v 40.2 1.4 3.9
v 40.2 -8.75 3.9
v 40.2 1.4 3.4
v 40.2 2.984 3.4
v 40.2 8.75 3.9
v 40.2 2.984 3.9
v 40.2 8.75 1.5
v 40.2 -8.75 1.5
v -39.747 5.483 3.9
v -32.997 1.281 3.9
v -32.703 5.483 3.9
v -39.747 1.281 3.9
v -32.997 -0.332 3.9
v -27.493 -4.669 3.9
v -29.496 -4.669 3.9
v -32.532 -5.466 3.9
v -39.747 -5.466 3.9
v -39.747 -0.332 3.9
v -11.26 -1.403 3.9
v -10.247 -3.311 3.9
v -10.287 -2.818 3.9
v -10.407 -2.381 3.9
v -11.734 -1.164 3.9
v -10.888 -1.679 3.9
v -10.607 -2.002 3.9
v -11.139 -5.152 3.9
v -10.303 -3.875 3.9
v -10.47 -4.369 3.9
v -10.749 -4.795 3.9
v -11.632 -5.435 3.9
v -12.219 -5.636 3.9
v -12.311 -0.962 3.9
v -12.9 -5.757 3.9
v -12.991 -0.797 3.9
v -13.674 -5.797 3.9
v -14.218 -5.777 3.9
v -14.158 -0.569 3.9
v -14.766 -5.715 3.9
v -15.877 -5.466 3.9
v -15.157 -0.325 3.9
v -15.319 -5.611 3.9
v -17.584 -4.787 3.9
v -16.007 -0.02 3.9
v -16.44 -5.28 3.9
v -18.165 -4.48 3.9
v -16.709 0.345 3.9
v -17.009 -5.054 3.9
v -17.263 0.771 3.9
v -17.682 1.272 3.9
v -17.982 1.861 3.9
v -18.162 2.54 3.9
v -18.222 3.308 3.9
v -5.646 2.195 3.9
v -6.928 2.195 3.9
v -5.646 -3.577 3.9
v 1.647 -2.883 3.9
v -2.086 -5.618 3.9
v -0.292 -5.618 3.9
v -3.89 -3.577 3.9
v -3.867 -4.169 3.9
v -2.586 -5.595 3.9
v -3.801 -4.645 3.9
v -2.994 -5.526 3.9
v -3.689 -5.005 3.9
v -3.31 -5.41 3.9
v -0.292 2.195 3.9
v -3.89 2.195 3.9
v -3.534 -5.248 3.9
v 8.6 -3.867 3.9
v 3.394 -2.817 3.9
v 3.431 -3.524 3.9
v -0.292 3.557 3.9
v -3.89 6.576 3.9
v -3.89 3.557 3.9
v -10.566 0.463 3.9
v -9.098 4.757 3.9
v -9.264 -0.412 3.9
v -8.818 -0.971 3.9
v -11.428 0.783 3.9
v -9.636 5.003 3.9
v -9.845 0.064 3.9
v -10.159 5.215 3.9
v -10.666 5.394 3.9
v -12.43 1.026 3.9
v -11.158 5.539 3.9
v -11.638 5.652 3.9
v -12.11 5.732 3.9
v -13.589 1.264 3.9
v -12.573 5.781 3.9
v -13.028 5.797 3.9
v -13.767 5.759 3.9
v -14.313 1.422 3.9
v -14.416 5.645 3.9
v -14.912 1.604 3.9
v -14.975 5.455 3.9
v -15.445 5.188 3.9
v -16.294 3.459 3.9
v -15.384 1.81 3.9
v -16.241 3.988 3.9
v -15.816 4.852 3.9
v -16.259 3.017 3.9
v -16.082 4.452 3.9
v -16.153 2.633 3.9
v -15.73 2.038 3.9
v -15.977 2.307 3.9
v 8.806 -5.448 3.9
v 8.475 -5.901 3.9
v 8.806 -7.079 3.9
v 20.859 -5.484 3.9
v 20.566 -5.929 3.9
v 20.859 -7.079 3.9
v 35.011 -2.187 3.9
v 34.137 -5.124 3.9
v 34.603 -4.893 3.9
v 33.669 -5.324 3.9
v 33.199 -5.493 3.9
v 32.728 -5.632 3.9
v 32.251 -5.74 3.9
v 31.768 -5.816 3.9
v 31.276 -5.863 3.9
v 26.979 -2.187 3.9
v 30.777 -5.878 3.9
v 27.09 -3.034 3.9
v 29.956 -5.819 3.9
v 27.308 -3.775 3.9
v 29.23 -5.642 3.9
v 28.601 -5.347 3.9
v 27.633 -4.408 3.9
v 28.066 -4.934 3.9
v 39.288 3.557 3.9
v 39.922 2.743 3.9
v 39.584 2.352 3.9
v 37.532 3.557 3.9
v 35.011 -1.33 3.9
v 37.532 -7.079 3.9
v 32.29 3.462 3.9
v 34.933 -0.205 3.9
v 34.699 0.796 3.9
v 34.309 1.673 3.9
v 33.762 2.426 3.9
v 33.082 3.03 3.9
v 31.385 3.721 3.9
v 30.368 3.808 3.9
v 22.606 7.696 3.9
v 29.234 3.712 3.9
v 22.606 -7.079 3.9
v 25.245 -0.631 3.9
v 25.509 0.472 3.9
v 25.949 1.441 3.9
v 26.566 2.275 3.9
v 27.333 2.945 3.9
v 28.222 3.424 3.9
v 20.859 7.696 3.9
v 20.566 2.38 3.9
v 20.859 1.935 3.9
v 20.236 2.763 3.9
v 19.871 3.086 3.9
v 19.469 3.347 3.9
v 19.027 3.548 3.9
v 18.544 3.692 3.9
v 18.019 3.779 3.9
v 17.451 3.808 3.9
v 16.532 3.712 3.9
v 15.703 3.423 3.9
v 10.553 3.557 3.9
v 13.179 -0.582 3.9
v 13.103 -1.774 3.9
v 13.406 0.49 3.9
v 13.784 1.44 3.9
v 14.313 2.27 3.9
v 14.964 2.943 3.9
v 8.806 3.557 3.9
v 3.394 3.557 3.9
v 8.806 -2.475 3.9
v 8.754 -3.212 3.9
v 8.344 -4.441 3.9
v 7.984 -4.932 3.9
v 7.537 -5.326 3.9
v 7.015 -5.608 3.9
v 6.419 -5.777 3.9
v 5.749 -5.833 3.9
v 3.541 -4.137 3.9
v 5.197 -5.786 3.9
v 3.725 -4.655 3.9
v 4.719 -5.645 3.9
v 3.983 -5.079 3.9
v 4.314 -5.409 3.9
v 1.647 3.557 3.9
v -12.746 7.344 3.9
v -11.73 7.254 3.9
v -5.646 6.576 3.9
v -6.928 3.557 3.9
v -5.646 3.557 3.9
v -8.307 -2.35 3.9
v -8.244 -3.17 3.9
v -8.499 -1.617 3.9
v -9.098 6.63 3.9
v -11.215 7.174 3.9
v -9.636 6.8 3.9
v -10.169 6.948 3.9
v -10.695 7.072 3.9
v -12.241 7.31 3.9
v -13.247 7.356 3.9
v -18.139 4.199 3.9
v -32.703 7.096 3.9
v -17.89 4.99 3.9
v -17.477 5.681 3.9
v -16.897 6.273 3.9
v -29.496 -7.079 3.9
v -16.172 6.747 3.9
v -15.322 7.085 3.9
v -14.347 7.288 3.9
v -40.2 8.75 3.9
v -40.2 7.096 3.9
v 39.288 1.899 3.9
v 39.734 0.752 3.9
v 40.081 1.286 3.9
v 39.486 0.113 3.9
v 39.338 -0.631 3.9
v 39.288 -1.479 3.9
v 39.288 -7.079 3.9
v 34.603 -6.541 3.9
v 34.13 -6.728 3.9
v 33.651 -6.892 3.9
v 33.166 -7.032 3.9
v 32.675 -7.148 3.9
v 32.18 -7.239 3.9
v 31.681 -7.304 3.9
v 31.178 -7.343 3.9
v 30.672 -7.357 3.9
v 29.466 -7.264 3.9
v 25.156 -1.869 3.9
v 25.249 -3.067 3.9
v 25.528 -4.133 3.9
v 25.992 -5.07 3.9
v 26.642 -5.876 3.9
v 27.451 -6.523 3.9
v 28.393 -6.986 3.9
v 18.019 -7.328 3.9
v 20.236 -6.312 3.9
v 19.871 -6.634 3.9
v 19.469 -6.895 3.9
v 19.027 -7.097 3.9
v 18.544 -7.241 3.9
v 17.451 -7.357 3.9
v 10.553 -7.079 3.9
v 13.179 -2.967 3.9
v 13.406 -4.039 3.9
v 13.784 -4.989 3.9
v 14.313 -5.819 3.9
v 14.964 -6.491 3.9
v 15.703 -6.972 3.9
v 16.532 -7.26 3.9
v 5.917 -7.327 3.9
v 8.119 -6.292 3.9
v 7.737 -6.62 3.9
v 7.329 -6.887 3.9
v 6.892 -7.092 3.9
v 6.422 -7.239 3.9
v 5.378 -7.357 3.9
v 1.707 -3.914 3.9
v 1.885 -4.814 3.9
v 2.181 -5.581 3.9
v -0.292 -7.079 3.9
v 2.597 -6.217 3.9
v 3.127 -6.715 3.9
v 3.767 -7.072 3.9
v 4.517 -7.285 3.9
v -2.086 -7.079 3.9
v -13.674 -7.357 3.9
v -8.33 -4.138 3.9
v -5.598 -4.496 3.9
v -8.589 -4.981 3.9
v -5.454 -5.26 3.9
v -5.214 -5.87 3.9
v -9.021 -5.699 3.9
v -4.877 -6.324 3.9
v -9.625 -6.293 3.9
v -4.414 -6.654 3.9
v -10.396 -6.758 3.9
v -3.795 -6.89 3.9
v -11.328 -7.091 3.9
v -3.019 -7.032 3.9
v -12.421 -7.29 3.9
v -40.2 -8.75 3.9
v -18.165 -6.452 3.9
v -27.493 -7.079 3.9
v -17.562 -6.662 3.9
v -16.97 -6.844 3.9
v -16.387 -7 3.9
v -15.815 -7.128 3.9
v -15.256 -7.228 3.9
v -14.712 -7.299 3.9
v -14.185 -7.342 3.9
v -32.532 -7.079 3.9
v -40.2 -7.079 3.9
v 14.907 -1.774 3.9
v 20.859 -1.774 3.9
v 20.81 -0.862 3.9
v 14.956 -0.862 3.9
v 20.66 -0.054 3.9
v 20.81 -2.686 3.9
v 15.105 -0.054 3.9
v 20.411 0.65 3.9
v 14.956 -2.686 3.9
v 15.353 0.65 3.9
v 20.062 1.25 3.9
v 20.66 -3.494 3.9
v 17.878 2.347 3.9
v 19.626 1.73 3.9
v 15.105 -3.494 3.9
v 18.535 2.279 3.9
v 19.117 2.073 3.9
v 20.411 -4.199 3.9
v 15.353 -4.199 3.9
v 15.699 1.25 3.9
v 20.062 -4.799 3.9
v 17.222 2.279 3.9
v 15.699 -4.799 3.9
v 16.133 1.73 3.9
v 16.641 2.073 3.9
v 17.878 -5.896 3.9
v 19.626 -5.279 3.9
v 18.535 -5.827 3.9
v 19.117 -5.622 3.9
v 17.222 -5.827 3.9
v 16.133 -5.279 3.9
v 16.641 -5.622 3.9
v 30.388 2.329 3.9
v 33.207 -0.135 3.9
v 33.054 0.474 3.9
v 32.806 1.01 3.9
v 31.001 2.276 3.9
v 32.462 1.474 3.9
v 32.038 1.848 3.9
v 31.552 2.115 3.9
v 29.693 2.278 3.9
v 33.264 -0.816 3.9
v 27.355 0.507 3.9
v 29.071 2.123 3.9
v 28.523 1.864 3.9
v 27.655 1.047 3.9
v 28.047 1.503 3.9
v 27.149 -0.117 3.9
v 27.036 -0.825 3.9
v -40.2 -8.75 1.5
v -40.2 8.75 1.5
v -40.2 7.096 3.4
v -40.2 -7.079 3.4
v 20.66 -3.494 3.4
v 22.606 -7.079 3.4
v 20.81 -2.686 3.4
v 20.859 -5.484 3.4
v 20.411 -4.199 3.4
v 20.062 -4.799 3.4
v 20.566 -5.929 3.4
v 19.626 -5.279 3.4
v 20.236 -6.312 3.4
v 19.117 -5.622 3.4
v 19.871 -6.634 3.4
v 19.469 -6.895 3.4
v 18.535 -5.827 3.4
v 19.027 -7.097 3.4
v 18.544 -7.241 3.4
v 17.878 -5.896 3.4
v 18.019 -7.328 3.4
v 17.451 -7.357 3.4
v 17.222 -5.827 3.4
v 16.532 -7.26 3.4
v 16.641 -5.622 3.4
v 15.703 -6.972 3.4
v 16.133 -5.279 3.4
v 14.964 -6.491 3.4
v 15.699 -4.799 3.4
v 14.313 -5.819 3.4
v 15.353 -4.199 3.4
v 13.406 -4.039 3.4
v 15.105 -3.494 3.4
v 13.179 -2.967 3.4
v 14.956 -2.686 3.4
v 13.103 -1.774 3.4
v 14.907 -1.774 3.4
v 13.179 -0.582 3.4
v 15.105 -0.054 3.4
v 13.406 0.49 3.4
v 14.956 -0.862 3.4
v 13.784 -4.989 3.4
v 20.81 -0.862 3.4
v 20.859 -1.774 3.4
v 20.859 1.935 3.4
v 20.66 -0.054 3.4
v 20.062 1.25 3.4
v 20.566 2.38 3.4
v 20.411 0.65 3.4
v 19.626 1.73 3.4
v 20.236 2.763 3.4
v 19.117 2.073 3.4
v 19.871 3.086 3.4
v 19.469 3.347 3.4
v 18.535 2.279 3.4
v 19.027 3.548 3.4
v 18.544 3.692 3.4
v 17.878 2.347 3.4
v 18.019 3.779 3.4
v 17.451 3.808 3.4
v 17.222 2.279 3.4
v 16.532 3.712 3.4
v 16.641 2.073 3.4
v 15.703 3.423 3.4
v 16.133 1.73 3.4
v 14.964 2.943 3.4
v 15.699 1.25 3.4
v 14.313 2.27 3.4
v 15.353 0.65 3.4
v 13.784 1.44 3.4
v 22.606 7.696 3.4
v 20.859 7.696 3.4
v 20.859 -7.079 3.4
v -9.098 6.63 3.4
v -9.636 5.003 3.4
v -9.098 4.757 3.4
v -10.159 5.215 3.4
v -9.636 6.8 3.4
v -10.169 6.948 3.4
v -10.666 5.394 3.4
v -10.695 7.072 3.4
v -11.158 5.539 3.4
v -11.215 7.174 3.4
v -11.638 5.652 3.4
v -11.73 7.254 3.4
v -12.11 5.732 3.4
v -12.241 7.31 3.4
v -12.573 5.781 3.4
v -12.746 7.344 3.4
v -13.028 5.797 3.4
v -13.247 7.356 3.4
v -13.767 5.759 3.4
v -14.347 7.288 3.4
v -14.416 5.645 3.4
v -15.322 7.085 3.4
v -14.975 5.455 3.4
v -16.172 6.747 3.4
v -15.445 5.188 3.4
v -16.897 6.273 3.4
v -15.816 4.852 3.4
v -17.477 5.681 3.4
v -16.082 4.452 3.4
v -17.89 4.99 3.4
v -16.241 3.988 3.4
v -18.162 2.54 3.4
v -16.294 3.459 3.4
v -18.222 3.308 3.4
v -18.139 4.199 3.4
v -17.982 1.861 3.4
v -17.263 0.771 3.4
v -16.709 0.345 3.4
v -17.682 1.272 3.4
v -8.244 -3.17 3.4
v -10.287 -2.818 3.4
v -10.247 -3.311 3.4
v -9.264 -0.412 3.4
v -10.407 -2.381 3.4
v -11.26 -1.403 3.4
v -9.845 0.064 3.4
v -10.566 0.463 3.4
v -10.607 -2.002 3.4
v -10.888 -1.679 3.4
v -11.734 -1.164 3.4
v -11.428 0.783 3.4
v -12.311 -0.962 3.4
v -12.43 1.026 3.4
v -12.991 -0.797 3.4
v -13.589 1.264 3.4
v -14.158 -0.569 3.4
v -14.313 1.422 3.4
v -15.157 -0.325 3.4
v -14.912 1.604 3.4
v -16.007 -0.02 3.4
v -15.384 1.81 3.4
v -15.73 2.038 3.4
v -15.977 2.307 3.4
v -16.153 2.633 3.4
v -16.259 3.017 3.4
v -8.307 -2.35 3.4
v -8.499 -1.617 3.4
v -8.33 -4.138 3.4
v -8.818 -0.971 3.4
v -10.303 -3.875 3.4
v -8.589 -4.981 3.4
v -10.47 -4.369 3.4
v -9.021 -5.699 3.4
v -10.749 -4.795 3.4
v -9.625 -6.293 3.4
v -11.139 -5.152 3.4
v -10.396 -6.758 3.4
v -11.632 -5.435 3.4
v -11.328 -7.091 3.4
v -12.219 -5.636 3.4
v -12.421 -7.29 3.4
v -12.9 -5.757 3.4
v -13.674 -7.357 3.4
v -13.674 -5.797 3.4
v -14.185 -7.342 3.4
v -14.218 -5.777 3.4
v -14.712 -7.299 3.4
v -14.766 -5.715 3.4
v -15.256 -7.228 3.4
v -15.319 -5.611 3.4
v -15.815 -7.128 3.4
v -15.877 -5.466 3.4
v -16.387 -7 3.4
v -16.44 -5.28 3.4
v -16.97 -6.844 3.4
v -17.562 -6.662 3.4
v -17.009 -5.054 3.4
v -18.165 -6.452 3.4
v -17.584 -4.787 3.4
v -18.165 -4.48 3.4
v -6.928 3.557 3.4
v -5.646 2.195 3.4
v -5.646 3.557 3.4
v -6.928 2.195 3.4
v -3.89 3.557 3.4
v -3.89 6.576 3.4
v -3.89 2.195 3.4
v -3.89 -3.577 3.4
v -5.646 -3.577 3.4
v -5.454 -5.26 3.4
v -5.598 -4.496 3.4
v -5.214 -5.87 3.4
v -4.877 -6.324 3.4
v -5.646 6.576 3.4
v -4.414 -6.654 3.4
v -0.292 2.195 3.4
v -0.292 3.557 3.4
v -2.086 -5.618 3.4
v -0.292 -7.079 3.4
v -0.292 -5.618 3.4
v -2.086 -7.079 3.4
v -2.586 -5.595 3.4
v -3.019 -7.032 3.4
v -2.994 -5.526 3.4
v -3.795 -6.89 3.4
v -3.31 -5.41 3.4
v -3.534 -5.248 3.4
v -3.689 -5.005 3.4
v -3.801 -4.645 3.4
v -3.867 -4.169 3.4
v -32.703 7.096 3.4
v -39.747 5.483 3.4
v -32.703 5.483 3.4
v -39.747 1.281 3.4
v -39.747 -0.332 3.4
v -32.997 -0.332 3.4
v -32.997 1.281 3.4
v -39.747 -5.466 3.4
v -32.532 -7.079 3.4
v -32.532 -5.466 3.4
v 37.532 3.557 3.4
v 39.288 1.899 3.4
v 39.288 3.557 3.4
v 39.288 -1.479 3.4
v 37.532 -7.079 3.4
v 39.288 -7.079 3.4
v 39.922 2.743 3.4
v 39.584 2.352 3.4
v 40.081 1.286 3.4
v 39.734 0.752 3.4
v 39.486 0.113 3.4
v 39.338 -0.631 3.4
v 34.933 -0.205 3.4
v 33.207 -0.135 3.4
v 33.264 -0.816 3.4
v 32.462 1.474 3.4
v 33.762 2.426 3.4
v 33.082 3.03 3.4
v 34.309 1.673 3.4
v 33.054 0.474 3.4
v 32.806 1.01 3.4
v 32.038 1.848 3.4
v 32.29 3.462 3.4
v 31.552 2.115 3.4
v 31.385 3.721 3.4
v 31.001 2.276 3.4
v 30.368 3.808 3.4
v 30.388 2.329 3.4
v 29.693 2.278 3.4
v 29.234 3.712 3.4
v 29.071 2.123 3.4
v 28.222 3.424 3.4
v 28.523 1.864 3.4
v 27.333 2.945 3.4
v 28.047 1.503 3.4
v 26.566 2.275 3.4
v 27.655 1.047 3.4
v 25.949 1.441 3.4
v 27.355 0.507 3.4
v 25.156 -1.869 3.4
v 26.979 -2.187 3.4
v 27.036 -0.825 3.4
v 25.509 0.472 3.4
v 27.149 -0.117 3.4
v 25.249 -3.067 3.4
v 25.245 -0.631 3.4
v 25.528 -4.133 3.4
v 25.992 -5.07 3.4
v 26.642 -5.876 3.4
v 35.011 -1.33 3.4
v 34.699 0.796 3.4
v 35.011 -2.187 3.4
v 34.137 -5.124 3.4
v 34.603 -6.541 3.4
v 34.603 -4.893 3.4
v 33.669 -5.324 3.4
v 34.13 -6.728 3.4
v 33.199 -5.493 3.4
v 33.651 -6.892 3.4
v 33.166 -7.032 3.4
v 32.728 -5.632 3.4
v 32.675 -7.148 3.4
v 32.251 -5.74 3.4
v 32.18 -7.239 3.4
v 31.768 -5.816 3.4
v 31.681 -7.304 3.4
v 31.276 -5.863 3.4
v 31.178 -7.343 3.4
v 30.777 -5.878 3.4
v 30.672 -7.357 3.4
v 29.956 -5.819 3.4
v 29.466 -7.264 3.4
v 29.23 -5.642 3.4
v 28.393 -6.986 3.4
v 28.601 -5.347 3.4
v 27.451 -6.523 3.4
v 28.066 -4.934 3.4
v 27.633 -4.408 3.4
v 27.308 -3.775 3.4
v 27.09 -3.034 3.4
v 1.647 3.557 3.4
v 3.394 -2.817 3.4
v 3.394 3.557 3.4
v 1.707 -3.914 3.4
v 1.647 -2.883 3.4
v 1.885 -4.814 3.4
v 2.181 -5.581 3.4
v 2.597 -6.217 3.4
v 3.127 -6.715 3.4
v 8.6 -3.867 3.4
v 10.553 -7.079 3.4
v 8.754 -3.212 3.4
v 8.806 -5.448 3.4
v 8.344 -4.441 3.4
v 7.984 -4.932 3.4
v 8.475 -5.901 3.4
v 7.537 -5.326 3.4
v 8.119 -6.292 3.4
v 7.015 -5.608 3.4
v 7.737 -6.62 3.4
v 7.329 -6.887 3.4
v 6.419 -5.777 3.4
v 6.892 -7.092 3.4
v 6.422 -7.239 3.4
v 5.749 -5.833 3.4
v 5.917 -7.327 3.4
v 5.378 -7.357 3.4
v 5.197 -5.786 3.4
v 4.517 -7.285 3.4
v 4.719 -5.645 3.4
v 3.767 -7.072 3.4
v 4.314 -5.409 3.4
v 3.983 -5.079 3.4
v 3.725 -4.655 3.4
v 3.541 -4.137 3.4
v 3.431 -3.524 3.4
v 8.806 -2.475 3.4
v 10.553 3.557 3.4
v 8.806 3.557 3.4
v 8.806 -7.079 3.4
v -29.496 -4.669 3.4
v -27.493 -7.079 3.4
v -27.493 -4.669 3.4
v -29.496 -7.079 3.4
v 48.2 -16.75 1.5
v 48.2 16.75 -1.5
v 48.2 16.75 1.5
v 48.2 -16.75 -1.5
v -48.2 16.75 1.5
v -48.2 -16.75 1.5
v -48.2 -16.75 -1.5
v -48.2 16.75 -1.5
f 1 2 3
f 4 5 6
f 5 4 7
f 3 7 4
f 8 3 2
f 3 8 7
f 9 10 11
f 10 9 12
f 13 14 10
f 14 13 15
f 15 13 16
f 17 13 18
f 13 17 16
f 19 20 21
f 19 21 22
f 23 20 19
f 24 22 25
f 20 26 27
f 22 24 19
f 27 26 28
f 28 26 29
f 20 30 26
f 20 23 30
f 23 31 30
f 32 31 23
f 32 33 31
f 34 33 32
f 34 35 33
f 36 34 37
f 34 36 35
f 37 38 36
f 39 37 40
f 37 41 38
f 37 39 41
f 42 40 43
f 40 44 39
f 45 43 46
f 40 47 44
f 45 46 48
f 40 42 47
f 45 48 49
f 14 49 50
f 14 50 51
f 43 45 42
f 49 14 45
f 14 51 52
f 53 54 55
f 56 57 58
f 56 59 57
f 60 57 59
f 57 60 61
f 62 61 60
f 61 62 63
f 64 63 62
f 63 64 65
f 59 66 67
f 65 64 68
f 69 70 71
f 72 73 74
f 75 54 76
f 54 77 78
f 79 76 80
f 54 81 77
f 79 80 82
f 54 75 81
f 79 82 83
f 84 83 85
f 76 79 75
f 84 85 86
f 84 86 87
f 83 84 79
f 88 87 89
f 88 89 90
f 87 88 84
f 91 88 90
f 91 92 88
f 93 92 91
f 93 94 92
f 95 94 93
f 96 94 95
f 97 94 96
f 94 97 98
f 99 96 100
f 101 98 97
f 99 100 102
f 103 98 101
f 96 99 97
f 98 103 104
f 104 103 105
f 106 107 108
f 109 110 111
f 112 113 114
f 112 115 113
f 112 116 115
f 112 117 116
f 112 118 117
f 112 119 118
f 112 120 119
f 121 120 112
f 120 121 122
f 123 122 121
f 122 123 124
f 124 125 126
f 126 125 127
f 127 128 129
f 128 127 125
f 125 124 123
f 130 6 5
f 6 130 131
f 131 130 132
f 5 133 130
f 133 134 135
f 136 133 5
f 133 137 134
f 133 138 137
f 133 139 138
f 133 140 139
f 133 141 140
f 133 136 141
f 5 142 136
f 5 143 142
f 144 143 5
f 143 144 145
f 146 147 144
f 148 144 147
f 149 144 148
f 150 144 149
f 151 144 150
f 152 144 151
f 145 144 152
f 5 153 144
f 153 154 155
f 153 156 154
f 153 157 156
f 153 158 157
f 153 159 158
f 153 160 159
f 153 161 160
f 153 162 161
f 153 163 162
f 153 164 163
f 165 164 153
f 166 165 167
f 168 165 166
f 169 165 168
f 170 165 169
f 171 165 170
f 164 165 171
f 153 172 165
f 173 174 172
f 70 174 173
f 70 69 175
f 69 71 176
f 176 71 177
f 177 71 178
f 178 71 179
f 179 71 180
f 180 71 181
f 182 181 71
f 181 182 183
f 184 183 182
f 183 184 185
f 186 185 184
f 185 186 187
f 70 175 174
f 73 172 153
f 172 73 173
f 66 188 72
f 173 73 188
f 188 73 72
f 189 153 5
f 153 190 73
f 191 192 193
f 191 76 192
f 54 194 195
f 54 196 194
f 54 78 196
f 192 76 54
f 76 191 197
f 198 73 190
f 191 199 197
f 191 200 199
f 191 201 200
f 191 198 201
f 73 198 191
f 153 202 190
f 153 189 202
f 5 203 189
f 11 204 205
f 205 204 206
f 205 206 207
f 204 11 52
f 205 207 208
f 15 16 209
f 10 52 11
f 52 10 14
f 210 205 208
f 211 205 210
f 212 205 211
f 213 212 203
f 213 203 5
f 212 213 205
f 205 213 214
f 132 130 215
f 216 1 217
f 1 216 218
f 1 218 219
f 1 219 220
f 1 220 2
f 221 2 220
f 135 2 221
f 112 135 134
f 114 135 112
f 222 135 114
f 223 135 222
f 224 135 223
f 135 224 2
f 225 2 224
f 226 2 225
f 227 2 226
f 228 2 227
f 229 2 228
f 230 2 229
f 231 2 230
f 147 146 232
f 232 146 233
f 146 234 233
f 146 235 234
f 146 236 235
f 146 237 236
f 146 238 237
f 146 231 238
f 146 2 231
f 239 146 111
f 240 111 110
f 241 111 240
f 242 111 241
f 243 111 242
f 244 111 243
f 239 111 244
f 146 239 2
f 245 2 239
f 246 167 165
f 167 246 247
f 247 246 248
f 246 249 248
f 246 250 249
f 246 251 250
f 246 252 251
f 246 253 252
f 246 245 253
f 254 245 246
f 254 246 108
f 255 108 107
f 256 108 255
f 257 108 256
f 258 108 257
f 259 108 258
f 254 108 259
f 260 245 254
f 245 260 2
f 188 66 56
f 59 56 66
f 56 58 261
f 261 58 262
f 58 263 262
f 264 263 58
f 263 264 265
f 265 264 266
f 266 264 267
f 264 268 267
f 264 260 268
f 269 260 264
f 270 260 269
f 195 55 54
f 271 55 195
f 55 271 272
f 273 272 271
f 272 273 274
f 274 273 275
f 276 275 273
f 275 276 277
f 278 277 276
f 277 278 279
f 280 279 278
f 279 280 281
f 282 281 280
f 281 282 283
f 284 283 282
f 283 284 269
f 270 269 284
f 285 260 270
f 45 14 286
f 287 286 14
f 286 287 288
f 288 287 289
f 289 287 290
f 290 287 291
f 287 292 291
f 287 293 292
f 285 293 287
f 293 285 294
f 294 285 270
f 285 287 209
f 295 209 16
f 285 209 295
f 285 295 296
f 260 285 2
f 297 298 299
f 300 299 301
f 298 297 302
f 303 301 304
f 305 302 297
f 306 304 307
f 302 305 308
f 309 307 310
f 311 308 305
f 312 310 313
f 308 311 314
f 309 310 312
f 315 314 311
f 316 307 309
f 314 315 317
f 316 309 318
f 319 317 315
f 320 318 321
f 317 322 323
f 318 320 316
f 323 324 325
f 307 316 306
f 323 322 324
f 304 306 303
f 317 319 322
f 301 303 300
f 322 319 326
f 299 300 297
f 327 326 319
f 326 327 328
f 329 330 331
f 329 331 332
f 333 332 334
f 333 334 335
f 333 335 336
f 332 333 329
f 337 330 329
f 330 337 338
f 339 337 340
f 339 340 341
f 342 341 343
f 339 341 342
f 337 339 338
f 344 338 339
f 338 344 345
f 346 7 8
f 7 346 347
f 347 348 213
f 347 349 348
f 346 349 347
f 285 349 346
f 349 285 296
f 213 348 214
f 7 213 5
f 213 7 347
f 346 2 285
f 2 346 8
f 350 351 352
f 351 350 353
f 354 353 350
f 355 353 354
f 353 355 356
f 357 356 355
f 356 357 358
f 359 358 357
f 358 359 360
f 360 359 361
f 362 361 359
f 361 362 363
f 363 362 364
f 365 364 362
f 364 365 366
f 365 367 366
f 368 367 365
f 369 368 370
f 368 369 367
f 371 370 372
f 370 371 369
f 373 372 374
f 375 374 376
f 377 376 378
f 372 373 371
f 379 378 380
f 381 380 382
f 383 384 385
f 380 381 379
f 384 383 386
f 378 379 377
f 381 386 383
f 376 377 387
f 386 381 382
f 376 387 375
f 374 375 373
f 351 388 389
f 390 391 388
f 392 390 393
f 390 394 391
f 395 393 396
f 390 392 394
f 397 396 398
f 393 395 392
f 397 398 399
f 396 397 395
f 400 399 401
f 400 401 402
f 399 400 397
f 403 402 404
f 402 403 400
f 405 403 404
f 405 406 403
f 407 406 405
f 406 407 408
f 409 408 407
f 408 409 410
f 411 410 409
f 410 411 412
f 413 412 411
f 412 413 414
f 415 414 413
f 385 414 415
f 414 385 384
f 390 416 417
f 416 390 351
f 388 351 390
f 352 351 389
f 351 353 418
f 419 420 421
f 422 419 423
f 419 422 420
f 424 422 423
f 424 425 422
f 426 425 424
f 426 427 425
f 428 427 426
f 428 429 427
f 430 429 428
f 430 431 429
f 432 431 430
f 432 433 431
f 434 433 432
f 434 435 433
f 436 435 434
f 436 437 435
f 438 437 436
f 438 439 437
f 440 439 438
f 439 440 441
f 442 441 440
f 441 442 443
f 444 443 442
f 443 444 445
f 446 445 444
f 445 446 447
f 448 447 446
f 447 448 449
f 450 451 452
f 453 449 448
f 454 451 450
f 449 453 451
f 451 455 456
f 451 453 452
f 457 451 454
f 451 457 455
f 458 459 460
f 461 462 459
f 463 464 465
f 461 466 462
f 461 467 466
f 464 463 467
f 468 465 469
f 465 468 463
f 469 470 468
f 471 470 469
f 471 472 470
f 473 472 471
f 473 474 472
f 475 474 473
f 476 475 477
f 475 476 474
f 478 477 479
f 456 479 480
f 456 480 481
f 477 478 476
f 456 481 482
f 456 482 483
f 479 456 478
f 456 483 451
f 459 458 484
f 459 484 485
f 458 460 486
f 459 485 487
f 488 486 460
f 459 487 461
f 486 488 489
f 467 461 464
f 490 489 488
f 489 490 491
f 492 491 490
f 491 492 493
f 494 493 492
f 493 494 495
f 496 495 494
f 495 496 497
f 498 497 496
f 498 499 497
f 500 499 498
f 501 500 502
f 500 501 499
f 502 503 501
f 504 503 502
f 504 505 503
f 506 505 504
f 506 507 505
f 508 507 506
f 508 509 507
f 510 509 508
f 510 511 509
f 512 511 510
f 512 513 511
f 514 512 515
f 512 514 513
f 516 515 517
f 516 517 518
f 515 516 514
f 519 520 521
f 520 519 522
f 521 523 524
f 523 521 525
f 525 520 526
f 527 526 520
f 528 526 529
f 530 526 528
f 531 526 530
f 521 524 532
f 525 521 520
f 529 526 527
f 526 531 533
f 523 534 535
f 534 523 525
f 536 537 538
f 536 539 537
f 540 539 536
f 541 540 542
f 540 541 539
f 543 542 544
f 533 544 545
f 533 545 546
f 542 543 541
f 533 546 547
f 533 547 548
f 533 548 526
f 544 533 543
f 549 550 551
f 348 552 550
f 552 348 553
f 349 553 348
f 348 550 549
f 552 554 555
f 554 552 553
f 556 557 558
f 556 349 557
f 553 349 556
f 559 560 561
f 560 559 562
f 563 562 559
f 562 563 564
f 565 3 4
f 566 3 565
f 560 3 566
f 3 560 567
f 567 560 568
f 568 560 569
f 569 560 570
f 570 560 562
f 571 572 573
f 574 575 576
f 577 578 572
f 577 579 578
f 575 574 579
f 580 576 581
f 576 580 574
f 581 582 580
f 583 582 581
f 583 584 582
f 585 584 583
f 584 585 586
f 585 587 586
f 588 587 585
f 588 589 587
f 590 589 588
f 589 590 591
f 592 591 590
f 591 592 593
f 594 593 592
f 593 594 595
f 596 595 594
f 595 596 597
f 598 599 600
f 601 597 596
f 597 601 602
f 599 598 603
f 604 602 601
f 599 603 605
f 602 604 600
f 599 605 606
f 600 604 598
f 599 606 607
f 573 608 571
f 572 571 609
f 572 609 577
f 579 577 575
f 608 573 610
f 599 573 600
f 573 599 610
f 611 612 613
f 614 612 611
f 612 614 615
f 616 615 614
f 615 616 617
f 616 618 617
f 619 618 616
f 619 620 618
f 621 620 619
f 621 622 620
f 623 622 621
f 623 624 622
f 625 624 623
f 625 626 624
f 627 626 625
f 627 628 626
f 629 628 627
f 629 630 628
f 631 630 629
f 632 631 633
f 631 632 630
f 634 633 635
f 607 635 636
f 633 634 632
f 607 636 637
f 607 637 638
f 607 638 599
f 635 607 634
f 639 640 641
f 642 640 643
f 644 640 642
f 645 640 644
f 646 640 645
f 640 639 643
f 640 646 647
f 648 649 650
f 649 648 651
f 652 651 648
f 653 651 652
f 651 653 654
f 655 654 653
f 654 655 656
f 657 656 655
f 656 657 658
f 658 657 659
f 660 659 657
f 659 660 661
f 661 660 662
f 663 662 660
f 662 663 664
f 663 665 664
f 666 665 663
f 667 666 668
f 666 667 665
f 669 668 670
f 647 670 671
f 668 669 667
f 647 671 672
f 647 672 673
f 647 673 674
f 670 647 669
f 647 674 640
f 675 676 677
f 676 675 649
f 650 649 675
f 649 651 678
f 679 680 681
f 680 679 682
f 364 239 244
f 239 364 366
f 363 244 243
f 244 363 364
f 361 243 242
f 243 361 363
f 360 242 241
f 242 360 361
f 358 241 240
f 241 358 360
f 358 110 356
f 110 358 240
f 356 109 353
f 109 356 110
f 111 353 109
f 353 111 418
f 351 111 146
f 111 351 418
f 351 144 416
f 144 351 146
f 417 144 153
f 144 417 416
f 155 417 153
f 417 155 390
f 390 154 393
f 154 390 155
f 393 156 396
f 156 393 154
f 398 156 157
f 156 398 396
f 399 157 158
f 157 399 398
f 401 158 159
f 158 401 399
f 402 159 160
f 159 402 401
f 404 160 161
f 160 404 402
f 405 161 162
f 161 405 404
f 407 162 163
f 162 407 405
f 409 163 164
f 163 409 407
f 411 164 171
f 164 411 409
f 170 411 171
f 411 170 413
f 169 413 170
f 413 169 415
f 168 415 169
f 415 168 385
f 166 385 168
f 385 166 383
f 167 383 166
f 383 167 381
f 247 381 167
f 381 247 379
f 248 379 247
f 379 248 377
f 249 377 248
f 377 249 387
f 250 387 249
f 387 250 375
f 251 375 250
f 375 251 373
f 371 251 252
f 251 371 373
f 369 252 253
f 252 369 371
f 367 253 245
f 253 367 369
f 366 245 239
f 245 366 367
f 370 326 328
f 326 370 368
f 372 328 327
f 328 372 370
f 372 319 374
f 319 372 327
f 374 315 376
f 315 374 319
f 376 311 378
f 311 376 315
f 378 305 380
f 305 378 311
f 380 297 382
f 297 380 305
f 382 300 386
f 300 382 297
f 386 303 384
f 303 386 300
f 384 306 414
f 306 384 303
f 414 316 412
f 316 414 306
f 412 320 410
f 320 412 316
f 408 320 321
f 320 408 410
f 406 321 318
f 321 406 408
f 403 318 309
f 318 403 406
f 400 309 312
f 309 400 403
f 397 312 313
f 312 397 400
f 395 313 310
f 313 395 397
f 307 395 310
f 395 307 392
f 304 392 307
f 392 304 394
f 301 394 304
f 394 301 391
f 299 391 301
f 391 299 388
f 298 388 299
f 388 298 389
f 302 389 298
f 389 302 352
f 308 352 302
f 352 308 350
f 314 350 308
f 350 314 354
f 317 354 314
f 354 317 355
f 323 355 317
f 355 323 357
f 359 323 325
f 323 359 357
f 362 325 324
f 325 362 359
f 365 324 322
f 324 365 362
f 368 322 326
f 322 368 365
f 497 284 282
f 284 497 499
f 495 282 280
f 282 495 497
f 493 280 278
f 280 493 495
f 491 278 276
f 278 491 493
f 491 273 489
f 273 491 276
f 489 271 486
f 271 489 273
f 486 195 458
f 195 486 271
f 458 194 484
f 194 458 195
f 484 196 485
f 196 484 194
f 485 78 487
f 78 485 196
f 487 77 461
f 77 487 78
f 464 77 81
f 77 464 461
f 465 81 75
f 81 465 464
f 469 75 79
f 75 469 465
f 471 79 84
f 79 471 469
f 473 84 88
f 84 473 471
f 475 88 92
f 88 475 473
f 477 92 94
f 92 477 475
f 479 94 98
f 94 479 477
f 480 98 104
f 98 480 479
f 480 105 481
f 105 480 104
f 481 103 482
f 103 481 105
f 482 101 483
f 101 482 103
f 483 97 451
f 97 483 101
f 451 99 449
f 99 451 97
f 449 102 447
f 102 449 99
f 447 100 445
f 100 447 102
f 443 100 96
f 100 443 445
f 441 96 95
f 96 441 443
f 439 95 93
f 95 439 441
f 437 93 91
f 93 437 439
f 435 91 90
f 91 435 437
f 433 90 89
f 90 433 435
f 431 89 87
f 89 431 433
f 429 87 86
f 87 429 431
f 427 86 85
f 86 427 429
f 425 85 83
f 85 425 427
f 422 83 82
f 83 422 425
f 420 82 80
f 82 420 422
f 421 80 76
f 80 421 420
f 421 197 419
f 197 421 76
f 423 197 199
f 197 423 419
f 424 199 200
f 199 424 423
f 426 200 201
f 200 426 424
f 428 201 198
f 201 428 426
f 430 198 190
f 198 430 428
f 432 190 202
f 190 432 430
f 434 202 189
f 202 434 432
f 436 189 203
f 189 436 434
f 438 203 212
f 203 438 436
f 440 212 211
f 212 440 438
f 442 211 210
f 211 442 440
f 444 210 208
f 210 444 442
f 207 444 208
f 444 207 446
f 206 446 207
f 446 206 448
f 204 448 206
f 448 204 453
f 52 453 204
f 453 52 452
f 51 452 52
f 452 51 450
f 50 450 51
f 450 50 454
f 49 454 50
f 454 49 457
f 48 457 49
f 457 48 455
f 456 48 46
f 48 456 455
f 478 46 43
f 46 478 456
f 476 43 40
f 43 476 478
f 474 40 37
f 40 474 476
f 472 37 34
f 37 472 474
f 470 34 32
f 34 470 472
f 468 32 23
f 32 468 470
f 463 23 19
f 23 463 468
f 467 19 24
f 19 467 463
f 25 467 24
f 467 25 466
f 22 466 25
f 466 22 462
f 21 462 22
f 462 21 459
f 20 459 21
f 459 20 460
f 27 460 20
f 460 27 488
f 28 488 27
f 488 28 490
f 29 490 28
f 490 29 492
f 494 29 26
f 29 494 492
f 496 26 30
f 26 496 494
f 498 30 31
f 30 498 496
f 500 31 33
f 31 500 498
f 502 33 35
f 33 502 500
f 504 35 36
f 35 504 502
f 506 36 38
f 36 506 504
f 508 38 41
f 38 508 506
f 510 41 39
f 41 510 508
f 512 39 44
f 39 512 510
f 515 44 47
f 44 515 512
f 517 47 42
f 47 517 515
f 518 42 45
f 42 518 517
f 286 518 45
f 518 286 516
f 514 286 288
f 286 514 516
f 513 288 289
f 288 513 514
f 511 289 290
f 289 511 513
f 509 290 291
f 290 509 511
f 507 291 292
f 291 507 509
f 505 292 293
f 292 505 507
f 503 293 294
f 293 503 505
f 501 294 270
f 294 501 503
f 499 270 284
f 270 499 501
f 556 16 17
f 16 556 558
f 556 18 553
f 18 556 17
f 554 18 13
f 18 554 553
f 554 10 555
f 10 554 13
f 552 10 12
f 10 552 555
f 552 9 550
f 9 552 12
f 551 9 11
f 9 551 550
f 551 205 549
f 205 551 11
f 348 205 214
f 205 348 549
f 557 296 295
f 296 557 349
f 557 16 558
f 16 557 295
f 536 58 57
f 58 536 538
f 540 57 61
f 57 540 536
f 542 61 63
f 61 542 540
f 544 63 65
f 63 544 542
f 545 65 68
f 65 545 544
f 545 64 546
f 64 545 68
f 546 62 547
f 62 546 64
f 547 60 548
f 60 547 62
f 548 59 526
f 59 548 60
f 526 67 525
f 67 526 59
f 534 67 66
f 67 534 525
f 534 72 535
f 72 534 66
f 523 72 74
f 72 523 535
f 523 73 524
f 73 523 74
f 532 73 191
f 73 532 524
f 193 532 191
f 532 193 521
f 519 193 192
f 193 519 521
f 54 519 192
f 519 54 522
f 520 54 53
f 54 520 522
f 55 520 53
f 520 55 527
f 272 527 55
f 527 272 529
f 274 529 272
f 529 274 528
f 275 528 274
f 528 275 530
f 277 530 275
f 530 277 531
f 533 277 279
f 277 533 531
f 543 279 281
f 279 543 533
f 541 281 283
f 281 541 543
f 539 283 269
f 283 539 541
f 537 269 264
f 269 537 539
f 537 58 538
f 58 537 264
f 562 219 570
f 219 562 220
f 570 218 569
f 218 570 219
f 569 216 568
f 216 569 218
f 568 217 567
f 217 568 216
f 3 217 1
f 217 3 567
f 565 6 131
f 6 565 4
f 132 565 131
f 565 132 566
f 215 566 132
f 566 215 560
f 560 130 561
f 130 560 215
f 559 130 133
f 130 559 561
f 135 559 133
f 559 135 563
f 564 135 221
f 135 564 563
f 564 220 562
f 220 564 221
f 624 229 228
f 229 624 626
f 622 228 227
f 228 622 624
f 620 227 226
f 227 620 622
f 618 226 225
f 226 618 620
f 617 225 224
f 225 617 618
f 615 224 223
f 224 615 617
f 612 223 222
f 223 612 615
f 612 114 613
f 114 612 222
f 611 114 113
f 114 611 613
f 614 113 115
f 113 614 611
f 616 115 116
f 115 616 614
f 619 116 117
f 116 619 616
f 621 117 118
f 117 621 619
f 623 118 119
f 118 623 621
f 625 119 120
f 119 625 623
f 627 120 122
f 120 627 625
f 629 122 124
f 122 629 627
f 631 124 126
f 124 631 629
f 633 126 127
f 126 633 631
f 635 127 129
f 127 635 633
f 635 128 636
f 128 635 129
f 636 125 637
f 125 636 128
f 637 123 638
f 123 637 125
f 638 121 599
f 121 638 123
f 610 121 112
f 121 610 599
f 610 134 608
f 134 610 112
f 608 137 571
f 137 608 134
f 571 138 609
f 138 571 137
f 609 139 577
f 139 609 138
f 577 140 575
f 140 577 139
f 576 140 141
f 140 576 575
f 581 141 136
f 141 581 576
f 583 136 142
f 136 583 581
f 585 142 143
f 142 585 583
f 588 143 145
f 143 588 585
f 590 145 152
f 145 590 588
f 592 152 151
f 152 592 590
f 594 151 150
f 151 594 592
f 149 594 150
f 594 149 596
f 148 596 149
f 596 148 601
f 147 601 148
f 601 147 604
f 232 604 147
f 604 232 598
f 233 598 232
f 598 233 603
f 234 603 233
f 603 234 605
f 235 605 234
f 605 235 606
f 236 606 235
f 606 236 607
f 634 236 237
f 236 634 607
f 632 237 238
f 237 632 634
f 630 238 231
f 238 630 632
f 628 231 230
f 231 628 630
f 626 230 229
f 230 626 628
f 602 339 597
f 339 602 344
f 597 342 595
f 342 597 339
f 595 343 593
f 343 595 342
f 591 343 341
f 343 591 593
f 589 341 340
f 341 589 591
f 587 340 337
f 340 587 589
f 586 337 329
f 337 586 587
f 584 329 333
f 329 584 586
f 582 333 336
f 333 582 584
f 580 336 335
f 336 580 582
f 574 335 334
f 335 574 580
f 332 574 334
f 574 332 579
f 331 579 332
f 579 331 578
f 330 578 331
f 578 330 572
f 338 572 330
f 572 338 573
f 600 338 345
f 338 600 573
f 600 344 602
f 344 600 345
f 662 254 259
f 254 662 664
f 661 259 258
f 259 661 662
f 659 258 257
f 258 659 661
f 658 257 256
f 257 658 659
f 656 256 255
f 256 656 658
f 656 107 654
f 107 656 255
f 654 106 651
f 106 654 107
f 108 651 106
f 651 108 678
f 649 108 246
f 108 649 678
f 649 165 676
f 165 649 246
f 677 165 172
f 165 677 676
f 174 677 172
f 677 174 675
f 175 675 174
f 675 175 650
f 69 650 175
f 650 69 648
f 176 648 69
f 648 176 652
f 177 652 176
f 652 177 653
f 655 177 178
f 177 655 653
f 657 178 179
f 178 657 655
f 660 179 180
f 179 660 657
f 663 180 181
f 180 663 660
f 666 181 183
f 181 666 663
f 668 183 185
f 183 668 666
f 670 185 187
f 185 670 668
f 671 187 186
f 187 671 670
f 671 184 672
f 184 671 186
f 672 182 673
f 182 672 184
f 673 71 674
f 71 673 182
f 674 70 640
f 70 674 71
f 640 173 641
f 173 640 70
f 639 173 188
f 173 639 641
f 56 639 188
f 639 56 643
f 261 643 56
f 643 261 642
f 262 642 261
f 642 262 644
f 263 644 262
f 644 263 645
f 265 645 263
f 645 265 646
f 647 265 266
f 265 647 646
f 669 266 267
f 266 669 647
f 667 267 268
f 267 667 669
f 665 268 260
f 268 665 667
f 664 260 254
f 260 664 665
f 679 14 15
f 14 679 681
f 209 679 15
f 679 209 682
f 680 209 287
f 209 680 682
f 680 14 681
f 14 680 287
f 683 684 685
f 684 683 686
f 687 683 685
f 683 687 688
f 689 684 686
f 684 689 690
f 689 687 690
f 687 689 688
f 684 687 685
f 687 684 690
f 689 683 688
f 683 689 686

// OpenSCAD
window_height = 17.5;
window_length = 80.4;
window_thickness = 2.4;

text_depth = 0.5;

border = 8;
base_thickness = 3;

base();
window();


module base(){
	cube([window_length+2*border, window_height+2*border, base_thickness], center=true);
}

module window(){
	translate([0, 0, base_thickness/2+window_thickness/2]){
		difference(){
			cube([window_length, window_height, window_thickness], center=true);
		
			translate([0, 0, window_thickness/2-text_depth])
				linear_extrude(text_depth)
					#text("E. Studer", size=14, font="Z003", halign="center", valign="center");
		}
	}
}
